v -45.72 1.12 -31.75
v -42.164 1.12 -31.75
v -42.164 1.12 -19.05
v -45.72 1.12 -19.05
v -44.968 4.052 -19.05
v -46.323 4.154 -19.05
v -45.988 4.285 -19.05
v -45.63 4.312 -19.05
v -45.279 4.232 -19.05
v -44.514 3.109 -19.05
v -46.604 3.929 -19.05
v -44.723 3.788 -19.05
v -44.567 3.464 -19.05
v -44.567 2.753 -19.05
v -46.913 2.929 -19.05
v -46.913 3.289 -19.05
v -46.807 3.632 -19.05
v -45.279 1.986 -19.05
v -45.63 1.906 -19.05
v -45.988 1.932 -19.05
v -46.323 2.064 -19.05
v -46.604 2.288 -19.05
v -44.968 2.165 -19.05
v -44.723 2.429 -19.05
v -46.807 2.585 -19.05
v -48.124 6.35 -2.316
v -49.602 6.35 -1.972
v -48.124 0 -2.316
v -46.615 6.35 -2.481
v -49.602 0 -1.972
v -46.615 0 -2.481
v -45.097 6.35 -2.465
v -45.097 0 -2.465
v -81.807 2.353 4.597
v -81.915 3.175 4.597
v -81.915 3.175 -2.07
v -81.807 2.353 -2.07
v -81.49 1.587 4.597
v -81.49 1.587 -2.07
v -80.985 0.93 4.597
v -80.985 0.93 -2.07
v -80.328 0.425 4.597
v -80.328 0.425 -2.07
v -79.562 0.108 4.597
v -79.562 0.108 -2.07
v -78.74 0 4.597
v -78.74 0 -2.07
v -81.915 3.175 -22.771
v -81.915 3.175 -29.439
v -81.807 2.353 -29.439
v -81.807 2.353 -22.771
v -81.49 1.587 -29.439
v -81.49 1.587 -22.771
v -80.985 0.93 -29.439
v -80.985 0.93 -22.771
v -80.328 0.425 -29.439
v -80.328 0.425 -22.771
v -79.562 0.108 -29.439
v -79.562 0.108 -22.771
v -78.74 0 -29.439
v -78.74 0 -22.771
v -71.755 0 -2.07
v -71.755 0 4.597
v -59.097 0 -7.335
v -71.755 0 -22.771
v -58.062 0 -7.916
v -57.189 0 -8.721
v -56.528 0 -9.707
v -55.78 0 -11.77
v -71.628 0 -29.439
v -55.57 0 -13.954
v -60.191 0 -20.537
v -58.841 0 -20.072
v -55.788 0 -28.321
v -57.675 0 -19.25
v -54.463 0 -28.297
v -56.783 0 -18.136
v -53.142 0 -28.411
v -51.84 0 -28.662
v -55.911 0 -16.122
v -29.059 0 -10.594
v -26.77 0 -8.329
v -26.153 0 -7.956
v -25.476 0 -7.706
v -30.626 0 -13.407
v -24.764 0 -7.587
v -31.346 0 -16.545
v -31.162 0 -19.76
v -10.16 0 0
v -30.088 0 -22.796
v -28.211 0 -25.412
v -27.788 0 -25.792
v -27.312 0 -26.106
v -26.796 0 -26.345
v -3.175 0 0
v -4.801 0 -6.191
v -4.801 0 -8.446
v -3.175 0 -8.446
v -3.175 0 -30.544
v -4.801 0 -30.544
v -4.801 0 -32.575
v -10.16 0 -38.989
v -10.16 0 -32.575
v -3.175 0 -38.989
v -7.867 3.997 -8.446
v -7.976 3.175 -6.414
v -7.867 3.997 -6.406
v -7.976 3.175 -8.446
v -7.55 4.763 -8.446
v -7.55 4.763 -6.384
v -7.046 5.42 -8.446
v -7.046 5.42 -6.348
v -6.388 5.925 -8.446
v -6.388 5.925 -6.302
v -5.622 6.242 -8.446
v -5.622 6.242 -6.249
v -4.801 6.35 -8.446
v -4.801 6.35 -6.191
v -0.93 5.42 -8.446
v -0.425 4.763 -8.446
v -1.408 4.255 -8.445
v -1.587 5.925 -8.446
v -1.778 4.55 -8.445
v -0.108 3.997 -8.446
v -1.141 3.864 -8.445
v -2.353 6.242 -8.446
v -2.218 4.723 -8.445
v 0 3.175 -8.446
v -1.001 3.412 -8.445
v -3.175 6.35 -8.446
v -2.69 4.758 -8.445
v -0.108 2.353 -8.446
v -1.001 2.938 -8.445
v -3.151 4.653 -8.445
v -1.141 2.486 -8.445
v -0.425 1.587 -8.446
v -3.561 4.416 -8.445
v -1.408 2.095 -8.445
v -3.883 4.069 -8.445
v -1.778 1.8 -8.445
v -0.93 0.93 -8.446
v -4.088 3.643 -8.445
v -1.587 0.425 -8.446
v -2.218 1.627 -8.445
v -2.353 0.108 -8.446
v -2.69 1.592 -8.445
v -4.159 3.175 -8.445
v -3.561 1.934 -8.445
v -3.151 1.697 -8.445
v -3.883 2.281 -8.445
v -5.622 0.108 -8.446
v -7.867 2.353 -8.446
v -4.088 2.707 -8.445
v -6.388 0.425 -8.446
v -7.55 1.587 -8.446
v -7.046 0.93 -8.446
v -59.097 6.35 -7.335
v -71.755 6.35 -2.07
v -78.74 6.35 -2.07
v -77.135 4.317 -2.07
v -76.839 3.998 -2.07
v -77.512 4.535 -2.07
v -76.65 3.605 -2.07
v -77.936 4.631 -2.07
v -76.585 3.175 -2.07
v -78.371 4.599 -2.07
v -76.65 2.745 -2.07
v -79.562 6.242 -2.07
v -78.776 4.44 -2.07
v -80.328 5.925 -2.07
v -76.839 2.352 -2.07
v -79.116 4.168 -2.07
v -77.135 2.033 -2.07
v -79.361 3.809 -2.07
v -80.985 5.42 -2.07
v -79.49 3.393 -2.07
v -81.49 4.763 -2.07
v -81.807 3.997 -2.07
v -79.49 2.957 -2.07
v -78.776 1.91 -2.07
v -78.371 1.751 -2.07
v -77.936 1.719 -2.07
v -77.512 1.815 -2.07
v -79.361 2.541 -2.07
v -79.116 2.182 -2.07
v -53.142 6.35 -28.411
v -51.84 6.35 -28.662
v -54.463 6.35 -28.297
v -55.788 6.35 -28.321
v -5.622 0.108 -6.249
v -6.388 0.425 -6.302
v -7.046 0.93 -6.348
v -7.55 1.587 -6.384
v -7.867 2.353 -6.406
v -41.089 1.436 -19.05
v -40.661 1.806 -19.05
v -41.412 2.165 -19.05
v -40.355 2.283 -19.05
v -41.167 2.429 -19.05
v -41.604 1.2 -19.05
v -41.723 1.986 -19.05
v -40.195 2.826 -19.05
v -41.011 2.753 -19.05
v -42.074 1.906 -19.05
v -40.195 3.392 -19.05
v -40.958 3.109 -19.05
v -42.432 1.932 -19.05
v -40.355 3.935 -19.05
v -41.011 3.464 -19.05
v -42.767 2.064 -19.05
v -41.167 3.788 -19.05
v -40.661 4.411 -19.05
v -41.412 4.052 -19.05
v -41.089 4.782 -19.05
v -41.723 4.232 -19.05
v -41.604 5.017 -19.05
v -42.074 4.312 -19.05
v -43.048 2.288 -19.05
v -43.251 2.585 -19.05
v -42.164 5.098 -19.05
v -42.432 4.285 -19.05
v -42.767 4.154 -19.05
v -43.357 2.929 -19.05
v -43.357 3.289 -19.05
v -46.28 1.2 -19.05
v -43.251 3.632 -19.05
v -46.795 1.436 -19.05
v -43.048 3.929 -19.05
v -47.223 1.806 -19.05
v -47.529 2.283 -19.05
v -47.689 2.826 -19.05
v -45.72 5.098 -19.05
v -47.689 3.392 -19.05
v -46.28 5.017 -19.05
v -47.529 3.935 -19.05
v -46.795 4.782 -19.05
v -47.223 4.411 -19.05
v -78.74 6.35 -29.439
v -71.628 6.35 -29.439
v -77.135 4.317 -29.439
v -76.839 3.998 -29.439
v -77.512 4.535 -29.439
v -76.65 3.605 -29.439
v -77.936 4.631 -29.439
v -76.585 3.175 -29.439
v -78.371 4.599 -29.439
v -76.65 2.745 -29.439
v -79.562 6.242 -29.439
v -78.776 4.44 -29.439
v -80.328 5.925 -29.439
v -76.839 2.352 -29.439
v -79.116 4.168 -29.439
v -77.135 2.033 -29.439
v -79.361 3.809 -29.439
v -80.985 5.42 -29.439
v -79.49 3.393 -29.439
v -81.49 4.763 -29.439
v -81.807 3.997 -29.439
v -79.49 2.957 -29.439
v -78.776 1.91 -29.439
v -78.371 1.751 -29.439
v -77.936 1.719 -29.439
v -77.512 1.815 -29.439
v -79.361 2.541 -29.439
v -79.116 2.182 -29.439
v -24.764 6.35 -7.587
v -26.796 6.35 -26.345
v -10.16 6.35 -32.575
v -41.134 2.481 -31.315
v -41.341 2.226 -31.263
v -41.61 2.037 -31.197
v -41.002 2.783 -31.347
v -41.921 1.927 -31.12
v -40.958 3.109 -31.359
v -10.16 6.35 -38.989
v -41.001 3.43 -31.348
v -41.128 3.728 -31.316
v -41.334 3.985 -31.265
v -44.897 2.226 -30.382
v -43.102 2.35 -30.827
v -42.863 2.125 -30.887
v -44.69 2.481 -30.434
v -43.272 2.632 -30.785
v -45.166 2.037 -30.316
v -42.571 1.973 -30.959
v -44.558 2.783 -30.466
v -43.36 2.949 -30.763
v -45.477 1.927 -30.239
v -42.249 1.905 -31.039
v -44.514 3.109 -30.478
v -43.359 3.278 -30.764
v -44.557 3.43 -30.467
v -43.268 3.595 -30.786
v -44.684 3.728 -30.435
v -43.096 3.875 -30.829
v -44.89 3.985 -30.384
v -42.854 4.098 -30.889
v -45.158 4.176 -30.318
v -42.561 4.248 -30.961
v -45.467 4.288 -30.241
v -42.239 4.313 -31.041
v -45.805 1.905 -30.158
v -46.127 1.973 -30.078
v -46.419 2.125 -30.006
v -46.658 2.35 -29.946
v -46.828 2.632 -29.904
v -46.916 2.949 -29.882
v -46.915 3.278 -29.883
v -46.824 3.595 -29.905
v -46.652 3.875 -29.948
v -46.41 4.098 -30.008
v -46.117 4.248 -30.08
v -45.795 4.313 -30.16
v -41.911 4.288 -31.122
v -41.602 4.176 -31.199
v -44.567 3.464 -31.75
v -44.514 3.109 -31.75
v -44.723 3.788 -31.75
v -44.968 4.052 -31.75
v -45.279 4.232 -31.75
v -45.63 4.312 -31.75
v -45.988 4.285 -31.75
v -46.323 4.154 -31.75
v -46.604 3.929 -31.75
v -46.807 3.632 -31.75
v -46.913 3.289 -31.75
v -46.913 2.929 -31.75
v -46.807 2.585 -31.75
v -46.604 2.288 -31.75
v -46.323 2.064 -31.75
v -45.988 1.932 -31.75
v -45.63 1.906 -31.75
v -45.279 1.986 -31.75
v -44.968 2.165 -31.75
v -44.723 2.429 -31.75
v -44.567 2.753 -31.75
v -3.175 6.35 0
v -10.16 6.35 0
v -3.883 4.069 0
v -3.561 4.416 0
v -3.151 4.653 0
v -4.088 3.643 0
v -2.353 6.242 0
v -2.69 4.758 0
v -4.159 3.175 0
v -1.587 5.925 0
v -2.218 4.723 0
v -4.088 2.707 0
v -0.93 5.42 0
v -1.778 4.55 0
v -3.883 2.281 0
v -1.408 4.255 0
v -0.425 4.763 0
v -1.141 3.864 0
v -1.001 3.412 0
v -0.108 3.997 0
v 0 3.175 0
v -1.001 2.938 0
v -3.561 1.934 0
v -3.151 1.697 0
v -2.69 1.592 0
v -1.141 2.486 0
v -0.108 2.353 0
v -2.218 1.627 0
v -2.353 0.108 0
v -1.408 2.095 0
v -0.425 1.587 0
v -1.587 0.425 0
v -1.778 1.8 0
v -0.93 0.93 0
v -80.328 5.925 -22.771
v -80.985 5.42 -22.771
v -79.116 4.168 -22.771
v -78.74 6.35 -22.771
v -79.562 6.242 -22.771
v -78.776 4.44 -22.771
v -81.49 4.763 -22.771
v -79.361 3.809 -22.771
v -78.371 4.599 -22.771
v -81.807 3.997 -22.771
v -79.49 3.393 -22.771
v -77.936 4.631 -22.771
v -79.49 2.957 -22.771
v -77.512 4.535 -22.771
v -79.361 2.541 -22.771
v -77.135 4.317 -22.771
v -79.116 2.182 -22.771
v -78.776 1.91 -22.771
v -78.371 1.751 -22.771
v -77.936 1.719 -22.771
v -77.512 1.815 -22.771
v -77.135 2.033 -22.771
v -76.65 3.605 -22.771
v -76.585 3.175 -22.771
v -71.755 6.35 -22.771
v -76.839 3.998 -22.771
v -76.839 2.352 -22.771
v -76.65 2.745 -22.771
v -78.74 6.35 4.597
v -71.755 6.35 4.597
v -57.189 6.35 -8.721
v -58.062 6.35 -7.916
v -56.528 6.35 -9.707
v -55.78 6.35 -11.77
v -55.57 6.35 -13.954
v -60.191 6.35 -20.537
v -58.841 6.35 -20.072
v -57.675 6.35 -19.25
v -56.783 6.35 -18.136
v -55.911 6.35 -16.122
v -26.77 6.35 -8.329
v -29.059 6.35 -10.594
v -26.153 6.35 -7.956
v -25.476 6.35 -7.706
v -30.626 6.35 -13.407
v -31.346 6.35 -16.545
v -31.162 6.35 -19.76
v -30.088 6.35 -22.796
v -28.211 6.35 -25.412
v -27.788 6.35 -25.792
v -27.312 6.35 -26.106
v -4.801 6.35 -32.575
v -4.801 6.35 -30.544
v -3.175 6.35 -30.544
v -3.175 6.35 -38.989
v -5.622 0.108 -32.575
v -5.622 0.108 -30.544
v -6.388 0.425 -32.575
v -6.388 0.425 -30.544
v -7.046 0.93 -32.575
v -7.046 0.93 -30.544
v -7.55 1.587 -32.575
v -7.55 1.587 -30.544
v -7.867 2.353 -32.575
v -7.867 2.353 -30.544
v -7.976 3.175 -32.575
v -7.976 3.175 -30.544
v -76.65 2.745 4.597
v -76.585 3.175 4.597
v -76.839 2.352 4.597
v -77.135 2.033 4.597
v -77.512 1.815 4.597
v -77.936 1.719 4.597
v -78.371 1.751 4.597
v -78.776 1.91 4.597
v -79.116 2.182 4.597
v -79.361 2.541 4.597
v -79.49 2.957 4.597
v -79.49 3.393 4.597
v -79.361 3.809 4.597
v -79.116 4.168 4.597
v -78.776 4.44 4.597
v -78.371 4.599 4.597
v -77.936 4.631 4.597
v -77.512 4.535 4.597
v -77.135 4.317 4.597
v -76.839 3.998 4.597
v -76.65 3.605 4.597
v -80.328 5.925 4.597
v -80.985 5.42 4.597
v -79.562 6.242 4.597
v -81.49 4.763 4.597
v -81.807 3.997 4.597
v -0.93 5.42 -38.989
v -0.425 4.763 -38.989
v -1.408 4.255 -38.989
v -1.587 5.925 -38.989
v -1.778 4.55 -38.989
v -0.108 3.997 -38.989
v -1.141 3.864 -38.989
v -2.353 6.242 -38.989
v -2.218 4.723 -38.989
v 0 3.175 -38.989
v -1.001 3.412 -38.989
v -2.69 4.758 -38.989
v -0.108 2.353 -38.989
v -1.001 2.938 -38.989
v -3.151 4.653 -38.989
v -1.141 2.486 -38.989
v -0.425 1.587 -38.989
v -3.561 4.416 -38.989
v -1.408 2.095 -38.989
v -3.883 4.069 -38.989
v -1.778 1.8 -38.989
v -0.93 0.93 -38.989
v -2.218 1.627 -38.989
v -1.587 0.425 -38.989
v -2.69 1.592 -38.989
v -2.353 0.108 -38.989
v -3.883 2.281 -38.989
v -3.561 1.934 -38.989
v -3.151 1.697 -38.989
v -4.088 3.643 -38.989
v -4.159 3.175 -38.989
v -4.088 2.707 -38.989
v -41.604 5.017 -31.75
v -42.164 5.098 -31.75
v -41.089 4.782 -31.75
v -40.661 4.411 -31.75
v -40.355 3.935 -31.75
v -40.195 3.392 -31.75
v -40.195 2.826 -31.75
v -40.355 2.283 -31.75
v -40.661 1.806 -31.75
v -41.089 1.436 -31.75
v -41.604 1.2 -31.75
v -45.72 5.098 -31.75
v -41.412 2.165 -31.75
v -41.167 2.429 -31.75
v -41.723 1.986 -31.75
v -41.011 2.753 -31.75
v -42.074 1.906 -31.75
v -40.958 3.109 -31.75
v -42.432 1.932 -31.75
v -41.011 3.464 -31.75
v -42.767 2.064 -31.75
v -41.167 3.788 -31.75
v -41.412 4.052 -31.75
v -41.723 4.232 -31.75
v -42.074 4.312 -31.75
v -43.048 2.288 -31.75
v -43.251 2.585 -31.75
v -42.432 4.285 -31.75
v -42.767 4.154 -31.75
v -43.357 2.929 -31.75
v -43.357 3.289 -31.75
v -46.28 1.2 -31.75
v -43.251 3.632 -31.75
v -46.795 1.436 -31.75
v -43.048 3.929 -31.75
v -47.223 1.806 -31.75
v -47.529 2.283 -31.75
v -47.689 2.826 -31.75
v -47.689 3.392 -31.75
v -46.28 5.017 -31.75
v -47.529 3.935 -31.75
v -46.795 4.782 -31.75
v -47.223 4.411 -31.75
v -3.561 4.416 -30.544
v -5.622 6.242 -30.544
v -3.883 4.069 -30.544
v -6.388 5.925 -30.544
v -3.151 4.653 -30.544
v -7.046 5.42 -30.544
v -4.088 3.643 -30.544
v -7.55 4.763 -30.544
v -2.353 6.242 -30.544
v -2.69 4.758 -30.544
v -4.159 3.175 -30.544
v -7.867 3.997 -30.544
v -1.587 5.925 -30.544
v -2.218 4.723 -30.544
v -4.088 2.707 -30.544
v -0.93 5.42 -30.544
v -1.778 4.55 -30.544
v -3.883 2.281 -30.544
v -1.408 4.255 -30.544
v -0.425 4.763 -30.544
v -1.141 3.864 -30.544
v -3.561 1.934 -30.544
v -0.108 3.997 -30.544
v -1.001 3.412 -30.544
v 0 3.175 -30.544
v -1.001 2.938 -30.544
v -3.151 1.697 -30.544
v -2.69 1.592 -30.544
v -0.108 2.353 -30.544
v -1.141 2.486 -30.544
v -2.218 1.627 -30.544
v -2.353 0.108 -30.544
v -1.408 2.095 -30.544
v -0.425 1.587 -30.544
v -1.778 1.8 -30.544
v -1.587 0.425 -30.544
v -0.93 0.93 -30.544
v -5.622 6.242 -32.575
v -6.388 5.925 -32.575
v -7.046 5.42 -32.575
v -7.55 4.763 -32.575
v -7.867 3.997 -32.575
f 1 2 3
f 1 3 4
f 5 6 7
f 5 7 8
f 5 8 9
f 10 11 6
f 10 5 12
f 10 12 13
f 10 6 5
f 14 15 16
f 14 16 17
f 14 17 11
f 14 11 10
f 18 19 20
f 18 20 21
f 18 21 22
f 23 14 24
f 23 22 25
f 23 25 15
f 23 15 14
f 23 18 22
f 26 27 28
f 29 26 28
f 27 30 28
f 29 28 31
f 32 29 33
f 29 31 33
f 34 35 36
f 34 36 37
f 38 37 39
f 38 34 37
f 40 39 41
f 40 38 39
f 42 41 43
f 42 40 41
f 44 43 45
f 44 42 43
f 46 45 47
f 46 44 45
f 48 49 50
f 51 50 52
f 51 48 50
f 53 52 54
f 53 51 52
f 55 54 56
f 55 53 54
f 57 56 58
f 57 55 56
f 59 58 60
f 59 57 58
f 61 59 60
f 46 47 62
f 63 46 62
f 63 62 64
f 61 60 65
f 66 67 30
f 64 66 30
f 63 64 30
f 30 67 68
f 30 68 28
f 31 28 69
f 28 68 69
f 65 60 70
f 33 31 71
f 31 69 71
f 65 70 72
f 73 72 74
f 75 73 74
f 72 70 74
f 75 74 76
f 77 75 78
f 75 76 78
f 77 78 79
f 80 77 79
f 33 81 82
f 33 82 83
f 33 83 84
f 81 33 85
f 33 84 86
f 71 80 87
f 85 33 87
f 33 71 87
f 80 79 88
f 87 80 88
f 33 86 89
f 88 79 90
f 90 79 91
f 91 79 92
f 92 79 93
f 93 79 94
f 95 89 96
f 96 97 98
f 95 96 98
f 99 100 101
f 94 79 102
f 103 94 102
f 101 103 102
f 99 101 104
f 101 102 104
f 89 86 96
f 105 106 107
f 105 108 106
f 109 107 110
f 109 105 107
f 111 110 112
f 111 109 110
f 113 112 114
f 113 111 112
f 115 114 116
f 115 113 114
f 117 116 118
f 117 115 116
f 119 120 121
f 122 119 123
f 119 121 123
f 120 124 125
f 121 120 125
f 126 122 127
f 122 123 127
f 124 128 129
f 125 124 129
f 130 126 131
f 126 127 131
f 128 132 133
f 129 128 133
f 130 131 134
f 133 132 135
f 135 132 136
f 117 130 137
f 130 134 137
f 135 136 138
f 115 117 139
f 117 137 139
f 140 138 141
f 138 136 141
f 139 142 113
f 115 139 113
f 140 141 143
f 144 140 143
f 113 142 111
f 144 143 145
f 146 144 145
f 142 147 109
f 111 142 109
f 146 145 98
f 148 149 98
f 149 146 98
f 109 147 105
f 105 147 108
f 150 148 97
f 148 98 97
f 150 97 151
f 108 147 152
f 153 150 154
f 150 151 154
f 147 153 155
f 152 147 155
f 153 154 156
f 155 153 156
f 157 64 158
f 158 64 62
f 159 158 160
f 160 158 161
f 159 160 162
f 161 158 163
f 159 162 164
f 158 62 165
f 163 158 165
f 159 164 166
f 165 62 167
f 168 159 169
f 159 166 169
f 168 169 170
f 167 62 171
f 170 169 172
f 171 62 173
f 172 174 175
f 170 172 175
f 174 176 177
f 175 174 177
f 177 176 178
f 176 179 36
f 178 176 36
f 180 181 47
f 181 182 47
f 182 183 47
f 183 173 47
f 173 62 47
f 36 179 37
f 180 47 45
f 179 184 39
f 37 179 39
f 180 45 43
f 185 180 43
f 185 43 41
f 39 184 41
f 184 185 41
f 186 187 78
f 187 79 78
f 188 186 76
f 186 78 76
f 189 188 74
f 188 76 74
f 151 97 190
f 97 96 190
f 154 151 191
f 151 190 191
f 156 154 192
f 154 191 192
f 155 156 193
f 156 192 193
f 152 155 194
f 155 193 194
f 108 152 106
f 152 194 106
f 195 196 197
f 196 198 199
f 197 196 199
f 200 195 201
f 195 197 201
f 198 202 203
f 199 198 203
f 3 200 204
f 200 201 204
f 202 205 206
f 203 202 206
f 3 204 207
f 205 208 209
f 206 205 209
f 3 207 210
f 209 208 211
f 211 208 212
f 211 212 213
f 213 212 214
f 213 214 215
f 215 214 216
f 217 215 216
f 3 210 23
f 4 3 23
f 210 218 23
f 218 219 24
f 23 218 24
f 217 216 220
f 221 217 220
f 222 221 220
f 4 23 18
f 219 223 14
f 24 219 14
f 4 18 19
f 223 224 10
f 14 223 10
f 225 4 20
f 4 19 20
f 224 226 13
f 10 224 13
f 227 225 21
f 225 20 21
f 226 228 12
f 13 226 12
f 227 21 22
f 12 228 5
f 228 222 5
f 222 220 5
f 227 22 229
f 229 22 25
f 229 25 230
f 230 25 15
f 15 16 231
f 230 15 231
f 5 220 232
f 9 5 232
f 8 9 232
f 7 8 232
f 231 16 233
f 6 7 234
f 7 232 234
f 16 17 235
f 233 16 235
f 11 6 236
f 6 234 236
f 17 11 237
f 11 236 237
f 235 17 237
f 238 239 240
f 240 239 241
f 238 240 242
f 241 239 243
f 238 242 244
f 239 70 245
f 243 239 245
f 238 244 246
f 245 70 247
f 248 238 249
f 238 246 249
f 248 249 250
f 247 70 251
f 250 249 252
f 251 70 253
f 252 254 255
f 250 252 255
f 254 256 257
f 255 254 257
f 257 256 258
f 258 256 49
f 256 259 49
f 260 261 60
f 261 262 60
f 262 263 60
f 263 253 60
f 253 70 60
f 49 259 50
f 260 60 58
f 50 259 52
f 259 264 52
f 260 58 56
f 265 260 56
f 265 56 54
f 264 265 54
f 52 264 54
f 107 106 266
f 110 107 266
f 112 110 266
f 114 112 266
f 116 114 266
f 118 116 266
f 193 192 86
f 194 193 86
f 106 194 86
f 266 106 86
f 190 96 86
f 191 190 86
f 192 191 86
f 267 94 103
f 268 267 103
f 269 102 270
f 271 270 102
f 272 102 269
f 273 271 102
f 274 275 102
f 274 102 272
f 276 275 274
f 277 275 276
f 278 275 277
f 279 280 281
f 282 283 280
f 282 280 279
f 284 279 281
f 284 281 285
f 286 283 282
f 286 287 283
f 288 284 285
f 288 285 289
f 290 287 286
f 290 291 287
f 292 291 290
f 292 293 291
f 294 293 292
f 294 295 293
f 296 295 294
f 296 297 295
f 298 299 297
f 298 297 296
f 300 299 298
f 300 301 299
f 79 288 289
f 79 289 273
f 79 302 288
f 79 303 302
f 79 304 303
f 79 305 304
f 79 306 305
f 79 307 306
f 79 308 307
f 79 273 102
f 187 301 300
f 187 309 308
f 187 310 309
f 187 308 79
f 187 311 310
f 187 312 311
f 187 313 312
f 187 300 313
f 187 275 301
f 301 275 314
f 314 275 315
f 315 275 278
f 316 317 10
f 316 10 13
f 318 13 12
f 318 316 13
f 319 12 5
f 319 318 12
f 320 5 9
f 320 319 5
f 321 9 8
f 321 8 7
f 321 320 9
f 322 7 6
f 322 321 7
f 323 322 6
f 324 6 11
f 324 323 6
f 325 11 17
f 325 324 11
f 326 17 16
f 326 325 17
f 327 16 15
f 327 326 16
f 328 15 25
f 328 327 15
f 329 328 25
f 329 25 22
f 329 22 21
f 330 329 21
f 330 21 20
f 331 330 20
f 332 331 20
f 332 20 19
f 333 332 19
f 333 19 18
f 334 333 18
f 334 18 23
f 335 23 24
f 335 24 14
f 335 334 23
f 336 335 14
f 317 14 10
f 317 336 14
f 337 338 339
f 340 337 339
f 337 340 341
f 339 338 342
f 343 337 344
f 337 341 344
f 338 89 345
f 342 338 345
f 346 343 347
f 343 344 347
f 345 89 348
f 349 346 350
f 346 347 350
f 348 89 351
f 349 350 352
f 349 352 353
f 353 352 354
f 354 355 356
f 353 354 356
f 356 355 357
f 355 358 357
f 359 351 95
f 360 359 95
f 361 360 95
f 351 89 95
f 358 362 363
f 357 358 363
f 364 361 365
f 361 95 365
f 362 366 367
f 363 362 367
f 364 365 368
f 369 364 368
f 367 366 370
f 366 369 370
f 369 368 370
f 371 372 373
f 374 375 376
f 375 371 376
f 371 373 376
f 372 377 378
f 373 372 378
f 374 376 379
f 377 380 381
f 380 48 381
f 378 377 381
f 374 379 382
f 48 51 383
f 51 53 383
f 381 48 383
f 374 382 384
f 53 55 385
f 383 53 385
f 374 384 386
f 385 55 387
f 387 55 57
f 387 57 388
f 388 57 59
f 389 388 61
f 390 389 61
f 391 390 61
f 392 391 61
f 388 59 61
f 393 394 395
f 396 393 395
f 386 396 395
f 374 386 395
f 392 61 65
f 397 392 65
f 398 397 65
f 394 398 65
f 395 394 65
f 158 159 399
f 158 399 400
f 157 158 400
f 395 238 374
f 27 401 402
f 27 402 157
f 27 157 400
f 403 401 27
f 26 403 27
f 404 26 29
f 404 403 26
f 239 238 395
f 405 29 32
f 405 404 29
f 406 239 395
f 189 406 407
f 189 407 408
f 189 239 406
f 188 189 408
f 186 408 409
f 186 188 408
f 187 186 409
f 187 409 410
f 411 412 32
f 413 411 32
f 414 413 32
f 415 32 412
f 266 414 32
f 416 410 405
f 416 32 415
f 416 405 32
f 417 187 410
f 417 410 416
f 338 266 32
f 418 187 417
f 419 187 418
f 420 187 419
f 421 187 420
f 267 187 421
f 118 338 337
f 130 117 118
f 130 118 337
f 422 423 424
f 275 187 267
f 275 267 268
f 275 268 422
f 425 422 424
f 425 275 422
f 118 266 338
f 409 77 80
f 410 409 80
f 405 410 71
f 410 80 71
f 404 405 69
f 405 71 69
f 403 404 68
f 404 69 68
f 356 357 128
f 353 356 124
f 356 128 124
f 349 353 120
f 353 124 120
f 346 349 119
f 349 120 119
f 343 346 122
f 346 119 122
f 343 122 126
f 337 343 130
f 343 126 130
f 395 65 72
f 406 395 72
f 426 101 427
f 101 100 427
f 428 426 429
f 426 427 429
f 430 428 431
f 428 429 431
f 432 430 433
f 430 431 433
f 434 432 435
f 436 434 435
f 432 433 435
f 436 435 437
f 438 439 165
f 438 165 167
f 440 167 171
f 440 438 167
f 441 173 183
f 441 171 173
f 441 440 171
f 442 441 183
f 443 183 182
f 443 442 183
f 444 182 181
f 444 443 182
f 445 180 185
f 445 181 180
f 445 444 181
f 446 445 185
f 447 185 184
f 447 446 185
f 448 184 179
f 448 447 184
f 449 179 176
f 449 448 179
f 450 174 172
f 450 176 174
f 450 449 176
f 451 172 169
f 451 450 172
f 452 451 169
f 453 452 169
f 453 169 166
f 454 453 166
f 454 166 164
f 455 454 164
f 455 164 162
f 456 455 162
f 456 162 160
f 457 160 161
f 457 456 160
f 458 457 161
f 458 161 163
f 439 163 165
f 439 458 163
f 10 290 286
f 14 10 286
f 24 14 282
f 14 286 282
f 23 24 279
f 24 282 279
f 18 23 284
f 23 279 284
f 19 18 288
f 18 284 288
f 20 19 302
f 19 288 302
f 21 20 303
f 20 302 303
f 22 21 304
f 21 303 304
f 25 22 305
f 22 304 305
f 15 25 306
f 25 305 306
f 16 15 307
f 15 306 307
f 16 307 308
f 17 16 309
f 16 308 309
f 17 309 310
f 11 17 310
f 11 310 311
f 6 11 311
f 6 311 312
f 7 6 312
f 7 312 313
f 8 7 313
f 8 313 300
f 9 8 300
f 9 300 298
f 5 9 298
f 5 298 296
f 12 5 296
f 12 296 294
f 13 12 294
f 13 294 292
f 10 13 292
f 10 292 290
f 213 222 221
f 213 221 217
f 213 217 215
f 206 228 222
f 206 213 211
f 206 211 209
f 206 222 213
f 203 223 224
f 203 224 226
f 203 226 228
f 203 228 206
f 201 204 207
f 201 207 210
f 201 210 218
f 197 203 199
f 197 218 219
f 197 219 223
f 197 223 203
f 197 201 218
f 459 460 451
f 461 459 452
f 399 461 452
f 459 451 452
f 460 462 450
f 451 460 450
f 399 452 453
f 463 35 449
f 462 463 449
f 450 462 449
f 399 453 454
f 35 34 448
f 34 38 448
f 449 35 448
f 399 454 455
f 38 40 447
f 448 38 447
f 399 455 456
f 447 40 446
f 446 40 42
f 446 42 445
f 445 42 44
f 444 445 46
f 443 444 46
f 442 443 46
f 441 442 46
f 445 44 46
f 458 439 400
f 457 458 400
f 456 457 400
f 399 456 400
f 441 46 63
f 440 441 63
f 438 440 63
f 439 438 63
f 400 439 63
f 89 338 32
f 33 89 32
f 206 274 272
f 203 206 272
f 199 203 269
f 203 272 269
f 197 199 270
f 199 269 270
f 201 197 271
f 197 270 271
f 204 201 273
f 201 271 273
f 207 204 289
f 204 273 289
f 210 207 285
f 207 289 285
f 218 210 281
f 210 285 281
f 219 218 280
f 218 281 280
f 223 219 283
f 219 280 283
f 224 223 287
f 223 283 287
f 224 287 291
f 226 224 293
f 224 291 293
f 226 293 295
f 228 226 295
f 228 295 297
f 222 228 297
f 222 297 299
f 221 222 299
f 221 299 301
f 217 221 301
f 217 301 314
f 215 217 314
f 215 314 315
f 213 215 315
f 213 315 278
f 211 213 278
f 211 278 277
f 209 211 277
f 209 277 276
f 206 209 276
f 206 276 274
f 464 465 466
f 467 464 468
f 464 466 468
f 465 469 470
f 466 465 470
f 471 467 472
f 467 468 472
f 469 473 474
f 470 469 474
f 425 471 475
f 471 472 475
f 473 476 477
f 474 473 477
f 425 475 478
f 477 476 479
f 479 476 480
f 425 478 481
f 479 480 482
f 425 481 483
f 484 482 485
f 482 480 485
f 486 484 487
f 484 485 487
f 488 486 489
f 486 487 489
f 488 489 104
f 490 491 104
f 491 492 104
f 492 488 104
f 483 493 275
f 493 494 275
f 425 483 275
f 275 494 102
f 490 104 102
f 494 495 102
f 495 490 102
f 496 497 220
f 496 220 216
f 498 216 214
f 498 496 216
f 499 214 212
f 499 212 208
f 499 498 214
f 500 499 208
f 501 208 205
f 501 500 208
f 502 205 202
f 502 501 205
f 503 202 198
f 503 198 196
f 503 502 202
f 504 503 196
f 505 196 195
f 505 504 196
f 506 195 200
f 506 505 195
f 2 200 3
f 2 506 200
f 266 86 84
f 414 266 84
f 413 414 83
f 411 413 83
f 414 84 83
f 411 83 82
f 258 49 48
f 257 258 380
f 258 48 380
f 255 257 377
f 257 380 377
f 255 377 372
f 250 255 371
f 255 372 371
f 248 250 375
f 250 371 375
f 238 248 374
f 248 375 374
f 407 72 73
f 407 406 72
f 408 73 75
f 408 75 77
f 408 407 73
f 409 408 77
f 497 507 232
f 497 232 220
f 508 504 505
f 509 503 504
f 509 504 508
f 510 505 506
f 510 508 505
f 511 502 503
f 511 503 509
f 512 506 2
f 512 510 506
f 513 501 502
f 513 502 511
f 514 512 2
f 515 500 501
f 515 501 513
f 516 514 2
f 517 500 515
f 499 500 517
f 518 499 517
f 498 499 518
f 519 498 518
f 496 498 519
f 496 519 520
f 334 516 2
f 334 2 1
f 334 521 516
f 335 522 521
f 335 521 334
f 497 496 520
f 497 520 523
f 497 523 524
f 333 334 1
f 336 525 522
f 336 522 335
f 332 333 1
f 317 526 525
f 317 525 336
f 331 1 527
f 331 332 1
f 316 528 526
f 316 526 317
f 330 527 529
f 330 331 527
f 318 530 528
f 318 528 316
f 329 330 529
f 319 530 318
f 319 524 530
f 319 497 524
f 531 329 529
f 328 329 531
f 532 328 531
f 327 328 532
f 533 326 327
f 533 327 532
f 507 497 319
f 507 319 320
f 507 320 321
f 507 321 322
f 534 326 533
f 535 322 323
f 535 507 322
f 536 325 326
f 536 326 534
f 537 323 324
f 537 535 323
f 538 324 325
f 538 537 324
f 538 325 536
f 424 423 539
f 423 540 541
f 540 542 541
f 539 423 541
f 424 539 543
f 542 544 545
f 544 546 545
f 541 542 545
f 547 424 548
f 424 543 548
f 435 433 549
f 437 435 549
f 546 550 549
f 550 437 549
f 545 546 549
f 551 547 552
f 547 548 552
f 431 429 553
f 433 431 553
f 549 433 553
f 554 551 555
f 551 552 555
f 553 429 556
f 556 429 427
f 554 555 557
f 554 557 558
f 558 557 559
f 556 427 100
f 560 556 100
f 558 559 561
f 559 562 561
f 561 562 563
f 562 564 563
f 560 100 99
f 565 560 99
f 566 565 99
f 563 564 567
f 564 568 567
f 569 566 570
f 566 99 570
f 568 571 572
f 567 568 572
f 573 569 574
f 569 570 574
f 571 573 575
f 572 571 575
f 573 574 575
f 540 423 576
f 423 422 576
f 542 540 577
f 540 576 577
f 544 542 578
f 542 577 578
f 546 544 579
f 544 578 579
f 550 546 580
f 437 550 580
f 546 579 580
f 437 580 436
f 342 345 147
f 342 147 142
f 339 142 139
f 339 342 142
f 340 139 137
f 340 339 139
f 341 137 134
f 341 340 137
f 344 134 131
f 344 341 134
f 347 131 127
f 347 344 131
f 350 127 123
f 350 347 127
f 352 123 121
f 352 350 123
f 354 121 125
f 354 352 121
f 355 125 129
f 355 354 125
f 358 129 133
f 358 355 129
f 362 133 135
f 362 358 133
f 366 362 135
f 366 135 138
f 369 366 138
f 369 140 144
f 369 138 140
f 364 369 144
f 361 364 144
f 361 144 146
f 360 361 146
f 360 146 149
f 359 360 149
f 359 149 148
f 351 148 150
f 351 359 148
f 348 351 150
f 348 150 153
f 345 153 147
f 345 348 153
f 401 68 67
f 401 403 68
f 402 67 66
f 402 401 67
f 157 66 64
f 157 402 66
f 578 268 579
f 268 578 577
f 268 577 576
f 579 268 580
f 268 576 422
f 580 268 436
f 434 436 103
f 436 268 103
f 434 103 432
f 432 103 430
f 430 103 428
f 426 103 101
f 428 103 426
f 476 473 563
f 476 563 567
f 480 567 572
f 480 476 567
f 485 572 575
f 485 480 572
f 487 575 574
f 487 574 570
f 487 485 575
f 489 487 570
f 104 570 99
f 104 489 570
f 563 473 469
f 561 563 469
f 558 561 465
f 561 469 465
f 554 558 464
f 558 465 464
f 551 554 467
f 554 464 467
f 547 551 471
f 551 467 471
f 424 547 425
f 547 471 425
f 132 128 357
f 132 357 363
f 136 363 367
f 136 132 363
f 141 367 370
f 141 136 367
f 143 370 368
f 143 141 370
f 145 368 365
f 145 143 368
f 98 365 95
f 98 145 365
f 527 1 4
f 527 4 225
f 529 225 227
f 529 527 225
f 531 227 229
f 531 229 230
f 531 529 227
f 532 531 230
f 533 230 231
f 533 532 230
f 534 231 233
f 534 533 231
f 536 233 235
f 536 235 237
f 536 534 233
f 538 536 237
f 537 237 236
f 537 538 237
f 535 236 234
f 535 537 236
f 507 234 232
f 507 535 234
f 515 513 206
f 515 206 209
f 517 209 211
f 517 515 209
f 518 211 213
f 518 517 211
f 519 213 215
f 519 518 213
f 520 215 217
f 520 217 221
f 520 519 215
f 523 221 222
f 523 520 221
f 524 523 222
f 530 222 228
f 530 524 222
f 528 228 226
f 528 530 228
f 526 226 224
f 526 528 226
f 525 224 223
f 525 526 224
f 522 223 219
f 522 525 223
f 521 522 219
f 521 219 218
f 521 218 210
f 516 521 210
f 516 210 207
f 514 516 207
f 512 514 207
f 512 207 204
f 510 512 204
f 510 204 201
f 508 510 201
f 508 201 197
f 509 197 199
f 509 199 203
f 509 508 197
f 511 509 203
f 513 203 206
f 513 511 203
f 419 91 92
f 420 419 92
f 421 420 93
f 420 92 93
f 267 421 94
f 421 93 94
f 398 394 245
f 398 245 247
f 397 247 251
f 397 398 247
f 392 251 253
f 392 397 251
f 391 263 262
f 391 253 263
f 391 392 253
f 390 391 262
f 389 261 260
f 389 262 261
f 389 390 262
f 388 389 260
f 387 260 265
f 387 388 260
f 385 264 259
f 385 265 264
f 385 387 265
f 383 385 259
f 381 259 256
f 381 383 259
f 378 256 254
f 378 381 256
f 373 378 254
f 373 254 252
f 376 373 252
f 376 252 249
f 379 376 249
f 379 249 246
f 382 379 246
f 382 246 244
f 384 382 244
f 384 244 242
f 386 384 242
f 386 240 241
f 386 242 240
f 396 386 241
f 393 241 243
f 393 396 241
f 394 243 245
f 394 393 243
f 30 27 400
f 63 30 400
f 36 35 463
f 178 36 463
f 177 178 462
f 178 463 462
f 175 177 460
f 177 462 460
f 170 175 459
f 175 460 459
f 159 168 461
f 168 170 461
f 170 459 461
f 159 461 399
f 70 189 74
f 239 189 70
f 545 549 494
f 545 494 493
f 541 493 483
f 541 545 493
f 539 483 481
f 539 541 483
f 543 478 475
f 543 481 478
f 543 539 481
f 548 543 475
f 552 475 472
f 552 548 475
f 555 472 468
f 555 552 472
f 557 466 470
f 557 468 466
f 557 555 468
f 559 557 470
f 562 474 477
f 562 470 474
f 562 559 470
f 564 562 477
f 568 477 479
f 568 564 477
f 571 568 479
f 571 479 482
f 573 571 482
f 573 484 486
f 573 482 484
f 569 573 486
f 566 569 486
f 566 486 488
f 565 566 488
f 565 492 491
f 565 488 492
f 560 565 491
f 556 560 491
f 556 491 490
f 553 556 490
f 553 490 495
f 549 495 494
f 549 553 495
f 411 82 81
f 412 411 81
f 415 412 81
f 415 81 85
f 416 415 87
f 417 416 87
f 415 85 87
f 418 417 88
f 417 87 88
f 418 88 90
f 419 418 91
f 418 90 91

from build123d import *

# Parameters (mm, degrees)
BOSS_EXTRUDE1_DEPTH     = 6.35
FILLET2_R               = 3.175
CUT_EXTRUDE2_DEPTH      = 91.397918676
CUT_EXTRUDE2_DEPTH_BACK = 91.397918676
SKETCH2_R               = 1.5875
SKETCH2_R_2             = 1.4605
CUT_EXTRUDE5_DEPTH      = 91.942464482
CUT_EXTRUDE7_DEPTH      = 25.4
FILLET3_R               = 3.175
SKETCH6_R               = 1.2065
BOSS_EXTRUDE2_DEPTH     = 12.7
SKETCH7_R               = 1.2065
CUT_EXTRUDE8_DEPTH      = 12.7
FILLET5_R               = 12.7
FILLET6_R               = 5.08


with BuildPart() as part:
    # Sketch1 → Boss-Extrude1 (new body)
    with BuildSketch(Plane(origin=(0, 0, 0), x_dir=(1, 0, 0), z_dir=(0, 1, 0))):
        Polygon((0, 0), (0, 38.989), (-10.16, 38.989), (-71.628, 29.4386), (-81.915, 29.4386), (-81.915, -4.5974), (-71.755, -4.5974), (-10.16, 0), align=None)
    extrude(amount=BOSS_EXTRUDE1_DEPTH)

    # Fillet2
    fillet2_edges = [part.edges().sort_by_distance(p)[0] for p in [
        (0, 0, -19.4945),
        (0, 6.35, -19.4945),
        (-81.915, 0, -12.4206),
        (-81.915, 6.35, -12.4206),
    ]]
    fillet(fillet2_edges, radius=FILLET2_R - 0.0001)  # a hair under: the kernel refuses the full size

    # Sketch2 → Cut-Extrude2 (cut, two sides: drawn at the far end of the back side and taken through both)
    with BuildSketch(Plane(origin=(-0.604981675, 0, 0), x_dir=(-1, 0, 0), z_dir=(0, 0, -1)).offset(-CUT_EXTRUDE2_DEPTH_BACK)):
        with Locations((1.966275702, 3.175)):
            Circle(SKETCH2_R)
        with Locations(Location((77.44064574, 3.175, 0), (0, 0, 180))):
            Circle(SKETCH2_R_2)
    extrude(amount=CUT_EXTRUDE2_DEPTH + CUT_EXTRUDE2_DEPTH_BACK, mode=Mode.SUBTRACT)

    # Sketch3 → Cut-Extrude5 (cut, through all)
    with BuildSketch(Plane(origin=(0, 0, 0), x_dir=(1, 0, 0), z_dir=(0, 1, 0))):
        with BuildLine():
            Line((-81.915, 22.7711), (-71.755, 22.7711))
            Line((-71.755, 22.7711), (-58.487579402, 20.207642468))
            ThreePointArc((-58.487579402, 20.207642468), (-55.580114305, 14.192748547), (-57.777398298, 7.883687982))
            Line((-57.777398298, 7.883687982), (-71.755, 2.0701))
            Line((-71.755, 2.0701), (-81.915, 2.0701))
            Line((-81.915, 2.0701), (-81.915, 22.7711))
        make_face()
        with BuildLine():
            Line((0, 30.5435), (0, 8.4455))
            Line((0, 8.4455), (-7.9756, 8.4455))
            Line((-7.9756, 8.4455), (-7.9756, 6.4135))
            Line((-7.9756, 6.4135), (-24.764375431, 7.587485542))
            ThreePointArc((-24.764375431, 7.587485542), (-25.820245836, 7.814780317), (-26.769908004, 8.32923828))
            ThreePointArc((-26.769908004, 8.32923828), (-31.345543526, 16.545378703), (-28.210906636, 25.41191441))
            ThreePointArc((-28.210906636, 25.41191441), (-27.55579932, 25.957953915), (-26.795645997, 26.34459543))
            Line((-26.795645997, 26.34459543), (-10.16, 32.5755))
            Line((-10.16, 32.5755), (-7.9756, 32.5755))
            Line((-7.9756, 32.5755), (-7.9756, 30.5435))
            Line((-7.9756, 30.5435), (0, 30.5435))
        make_face()
    extrude(amount=CUT_EXTRUDE5_DEPTH, mode=Mode.SUBTRACT)

    # Sketch5 → Cut-Extrude7 (cut)
    with BuildSketch(Plane(origin=(0, 6.35, 0), x_dir=(1, 0, 0), z_dir=(0, 1, 0))):
        Polygon((-10.16, 38.989), (-53.78735915, 28.179846815), (-71.628, 29.4386), align=None)
        Polygon((-10.16, 0), (-47.394119509, 2.627067431), (-71.755, -4.5974), align=None)
    extrude(amount=-CUT_EXTRUDE7_DEPTH, mode=Mode.SUBTRACT)

    # Fillet3
    fillet3_edges = [part.edges().sort_by_distance(p)[0] for p in [
        (-7.9756, 0, -7.4295),
        (-7.9756, 6.35, -7.4295),
        (-7.9756, 0, -31.5595),
        (-7.9756, 6.35, -31.5595),
    ]]
    fillet(fillet3_edges, radius=FILLET3_R - 0.0001)  # a hair under: the kernel refuses the full size

    # Sketch7 → Cut-Extrude8 (cut)
    with BuildSketch(Plane(origin=(0, 0, -31.75), x_dir=(-1, 0, 0), z_dir=(0, 0, -1))):
        with Locations(Location((45.72, 3.108706623, 0), (0, 0, 180))):
            Circle(SKETCH7_R)
        with Locations(Location((42.164, 3.108706623, 0), (0, 0, 180))):
            Circle(SKETCH7_R)
    extrude(amount=-CUT_EXTRUDE8_DEPTH, mode=Mode.SUBTRACT)

    # Fillet5
    fillet5_edges = [part.edges().sort_by_distance(p)[0] for p in [
        (-53.78735915, 3.175, -28.179846815),
        (-47.394119509, 3.175, -2.627067431),
    ]]
    fillet(fillet5_edges, radius=FILLET5_R)

    # Fillet6
    fillet6_edges = [part.edges().sort_by_distance(p)[0] for p in [
        (-57.777398298, 3.175, -7.883687982),
        (-58.487579402, 3.175, -20.207642468),
    ]]
    fillet(fillet6_edges, radius=FILLET6_R)


with BuildPart() as body_2:
    # Sketch6 → Boss-Extrude2 (new body)
    with BuildSketch(Plane.XY.offset(-31.75)):
        with BuildLine():
            Line((-45.72, 5.097507922), (-42.164, 5.097507922))
            ThreePointArc((-42.164, 5.097507922), (-40.175198702, 3.108706623), (-42.164, 1.119905325))
            Line((-42.164, 1.119905325), (-45.72, 1.119905325))
            ThreePointArc((-45.72, 1.119905325), (-47.708801298, 3.108706623), (-45.72, 5.097507922))
        make_face()
        with Locations((-45.72, 3.108706623)):
            Circle(SKETCH6_R, mode=Mode.SUBTRACT)
        with Locations((-42.164, 3.108706623)):
            Circle(SKETCH6_R, mode=Mode.SUBTRACT)
    extrude(amount=BOSS_EXTRUDE2_DEPTH)


solid = Compound([part.part, body_2.part])
